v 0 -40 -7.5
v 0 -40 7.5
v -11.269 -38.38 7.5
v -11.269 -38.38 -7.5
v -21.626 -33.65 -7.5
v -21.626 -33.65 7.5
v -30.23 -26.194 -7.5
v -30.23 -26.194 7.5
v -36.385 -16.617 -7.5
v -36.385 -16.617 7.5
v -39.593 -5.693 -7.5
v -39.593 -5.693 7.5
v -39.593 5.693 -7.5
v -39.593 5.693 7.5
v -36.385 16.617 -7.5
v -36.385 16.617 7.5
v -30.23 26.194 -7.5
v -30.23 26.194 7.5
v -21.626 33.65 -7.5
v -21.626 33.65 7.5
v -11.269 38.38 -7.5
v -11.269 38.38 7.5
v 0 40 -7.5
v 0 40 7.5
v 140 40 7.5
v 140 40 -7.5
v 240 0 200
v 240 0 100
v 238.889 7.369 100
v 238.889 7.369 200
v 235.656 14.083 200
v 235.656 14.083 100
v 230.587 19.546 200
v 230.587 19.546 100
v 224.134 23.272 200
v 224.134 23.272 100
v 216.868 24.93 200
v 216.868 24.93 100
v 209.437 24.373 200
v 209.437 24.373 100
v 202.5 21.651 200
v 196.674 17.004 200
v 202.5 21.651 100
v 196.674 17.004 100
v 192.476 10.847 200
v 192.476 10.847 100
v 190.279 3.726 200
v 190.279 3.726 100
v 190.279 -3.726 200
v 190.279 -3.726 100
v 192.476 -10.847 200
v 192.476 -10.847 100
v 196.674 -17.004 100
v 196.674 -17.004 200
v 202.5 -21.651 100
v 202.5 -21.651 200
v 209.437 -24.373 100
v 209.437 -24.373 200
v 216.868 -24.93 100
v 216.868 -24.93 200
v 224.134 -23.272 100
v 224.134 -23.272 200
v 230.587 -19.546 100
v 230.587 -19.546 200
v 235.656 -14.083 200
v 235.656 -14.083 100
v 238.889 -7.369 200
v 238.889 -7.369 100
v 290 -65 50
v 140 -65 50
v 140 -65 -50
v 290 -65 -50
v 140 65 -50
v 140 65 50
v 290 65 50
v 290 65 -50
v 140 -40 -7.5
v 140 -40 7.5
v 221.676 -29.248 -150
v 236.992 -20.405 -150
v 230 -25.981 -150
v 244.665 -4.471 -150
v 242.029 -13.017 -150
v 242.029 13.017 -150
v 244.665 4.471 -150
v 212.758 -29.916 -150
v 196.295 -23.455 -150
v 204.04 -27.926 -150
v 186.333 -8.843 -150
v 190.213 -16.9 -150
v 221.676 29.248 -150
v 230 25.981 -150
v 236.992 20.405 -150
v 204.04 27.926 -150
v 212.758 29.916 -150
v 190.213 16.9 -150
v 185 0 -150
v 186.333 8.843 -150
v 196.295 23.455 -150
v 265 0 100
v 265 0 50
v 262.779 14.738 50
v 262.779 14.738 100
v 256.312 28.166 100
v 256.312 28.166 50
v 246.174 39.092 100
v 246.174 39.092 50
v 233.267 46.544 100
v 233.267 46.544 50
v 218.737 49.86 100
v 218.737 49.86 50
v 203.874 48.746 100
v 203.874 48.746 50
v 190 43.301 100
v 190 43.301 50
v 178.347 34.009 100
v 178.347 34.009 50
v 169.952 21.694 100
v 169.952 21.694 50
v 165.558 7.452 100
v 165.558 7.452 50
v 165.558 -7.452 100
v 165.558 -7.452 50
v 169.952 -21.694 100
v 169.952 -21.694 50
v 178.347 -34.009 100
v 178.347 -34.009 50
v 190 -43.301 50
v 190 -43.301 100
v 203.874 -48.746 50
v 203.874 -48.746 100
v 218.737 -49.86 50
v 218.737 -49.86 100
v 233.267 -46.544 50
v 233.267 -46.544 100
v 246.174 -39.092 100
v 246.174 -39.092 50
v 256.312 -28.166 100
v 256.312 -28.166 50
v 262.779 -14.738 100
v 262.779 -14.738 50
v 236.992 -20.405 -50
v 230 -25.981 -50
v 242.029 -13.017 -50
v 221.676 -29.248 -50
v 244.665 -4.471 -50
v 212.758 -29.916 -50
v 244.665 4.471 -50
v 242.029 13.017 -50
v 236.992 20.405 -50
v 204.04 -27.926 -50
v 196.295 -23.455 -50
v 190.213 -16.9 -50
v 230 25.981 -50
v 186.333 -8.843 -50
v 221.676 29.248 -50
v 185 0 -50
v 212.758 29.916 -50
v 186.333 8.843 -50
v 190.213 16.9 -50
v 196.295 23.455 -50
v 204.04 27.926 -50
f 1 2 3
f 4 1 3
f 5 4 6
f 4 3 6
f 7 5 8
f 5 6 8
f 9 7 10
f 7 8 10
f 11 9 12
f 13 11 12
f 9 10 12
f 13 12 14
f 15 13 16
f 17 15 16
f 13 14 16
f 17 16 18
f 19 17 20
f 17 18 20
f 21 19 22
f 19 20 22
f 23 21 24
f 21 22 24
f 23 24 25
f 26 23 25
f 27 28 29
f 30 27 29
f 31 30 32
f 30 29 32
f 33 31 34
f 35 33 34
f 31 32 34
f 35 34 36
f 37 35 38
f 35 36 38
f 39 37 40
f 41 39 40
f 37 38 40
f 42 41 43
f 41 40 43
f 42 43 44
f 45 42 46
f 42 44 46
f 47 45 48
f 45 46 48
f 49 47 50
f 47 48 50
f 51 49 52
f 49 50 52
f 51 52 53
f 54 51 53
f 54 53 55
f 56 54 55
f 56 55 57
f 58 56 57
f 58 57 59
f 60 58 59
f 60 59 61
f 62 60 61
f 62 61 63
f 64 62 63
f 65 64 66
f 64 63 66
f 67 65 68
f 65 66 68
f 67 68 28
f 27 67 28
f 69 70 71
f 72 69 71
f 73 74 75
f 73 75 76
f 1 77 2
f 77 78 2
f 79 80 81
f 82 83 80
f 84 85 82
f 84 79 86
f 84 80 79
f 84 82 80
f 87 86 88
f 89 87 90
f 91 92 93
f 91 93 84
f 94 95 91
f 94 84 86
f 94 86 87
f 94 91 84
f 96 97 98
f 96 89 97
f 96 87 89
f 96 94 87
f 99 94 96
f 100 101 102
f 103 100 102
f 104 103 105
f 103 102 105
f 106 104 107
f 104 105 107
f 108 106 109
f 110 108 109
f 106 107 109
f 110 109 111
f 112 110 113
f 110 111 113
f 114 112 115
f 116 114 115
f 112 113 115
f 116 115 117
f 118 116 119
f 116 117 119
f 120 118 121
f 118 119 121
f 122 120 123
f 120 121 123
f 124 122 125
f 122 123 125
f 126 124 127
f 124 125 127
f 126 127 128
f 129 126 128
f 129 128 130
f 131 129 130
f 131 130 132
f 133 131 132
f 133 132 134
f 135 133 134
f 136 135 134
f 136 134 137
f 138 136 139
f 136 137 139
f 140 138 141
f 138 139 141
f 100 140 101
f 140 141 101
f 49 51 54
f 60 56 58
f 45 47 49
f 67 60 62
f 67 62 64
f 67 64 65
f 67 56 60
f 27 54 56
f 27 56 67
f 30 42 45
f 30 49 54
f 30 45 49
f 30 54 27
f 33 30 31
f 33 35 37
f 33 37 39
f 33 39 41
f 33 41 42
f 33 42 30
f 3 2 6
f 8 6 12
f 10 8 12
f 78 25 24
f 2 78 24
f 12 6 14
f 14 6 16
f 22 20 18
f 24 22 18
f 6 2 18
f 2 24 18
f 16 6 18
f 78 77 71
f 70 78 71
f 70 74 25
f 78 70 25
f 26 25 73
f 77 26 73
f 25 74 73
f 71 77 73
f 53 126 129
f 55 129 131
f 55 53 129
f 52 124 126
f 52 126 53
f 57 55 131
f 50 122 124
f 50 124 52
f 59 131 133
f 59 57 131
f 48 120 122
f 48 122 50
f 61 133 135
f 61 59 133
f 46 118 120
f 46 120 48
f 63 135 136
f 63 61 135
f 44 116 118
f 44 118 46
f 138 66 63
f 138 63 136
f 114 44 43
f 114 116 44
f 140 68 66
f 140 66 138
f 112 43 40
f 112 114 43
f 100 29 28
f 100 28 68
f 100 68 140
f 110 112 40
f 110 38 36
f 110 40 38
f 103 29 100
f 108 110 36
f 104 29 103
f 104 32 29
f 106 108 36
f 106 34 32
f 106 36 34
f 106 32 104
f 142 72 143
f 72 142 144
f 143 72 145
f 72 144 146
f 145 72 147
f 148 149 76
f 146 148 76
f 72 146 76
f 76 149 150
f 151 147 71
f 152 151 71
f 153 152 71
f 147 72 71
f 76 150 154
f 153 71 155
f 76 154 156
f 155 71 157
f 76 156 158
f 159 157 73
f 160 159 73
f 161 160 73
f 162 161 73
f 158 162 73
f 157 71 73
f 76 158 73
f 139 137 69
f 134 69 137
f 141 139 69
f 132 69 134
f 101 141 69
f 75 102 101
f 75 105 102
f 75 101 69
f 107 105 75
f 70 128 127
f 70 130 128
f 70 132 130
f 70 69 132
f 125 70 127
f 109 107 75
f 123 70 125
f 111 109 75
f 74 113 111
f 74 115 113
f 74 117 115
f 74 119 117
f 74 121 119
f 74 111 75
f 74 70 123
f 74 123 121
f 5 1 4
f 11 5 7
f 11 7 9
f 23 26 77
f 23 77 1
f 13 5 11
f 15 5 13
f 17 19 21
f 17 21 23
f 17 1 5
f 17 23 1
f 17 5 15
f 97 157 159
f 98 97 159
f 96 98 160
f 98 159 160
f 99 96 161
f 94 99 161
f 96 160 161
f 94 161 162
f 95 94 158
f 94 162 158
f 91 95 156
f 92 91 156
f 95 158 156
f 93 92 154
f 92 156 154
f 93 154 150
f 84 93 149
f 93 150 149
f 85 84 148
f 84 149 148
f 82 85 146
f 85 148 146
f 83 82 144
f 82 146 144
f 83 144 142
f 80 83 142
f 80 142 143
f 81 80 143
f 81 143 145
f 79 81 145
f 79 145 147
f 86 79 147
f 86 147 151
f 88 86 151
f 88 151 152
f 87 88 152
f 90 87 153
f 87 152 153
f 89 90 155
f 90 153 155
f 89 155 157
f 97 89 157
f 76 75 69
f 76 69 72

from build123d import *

# Parameters (mm, degrees)
BOSS_EXTRUDE1_DEPTH = 7.5
SKETCH3_W           = 100
SKETCH3_H           = 130
BOSS_EXTRUDE2_DEPTH = 150
SKETCH4_R           = 30
BOSS_EXTRUDE3_DEPTH = 100
SKETCH5_R           = 50
BOSS_EXTRUDE4_DEPTH = 50
SKETCH6_R           = 25
BOSS_EXTRUDE5_DEPTH = 100


with BuildPart() as part:
    # Sketch1 → Boss-Extrude1 (new body, symmetric)
    with BuildSketch(Plane.XY):
        with BuildLine():
            Line((0, 40), (140, 40))
            Line((140, 40), (140, -40))
            Line((140, -40), (0, -40))
            ThreePointArc((0, -40), (-40, 0), (0, 40))
        make_face()
    extrude(amount=BOSS_EXTRUDE1_DEPTH, both=True)

    # Sketch3 → Boss-Extrude2 (add)
    with BuildSketch(Plane(origin=(140, 0, 0), x_dir=(0, 0, -1), z_dir=(1, 0, 0))):
        Rectangle(SKETCH3_W, SKETCH3_H)
    extrude(amount=BOSS_EXTRUDE2_DEPTH)

    # Sketch4 → Boss-Extrude3 (add)
    with BuildSketch(Plane(origin=(0, 0, -50), x_dir=(-1, 0, 0), z_dir=(0, 0, -1))):
        with Locations((-215, 0)):
            Circle(SKETCH4_R)
    extrude(amount=BOSS_EXTRUDE3_DEPTH)

    # Sketch5 → Boss-Extrude4 (add)
    with BuildSketch(Plane.XY.offset(50)):
        with Locations((215, 0)):
            Circle(SKETCH5_R)
    extrude(amount=BOSS_EXTRUDE4_DEPTH)

    # Sketch6 → Boss-Extrude5 (add)
    with BuildSketch(Plane.XY.offset(100)):
        with Locations((215, 0)):
            Circle(SKETCH6_R)
    extrude(amount=BOSS_EXTRUDE5_DEPTH)


solid = part.part
